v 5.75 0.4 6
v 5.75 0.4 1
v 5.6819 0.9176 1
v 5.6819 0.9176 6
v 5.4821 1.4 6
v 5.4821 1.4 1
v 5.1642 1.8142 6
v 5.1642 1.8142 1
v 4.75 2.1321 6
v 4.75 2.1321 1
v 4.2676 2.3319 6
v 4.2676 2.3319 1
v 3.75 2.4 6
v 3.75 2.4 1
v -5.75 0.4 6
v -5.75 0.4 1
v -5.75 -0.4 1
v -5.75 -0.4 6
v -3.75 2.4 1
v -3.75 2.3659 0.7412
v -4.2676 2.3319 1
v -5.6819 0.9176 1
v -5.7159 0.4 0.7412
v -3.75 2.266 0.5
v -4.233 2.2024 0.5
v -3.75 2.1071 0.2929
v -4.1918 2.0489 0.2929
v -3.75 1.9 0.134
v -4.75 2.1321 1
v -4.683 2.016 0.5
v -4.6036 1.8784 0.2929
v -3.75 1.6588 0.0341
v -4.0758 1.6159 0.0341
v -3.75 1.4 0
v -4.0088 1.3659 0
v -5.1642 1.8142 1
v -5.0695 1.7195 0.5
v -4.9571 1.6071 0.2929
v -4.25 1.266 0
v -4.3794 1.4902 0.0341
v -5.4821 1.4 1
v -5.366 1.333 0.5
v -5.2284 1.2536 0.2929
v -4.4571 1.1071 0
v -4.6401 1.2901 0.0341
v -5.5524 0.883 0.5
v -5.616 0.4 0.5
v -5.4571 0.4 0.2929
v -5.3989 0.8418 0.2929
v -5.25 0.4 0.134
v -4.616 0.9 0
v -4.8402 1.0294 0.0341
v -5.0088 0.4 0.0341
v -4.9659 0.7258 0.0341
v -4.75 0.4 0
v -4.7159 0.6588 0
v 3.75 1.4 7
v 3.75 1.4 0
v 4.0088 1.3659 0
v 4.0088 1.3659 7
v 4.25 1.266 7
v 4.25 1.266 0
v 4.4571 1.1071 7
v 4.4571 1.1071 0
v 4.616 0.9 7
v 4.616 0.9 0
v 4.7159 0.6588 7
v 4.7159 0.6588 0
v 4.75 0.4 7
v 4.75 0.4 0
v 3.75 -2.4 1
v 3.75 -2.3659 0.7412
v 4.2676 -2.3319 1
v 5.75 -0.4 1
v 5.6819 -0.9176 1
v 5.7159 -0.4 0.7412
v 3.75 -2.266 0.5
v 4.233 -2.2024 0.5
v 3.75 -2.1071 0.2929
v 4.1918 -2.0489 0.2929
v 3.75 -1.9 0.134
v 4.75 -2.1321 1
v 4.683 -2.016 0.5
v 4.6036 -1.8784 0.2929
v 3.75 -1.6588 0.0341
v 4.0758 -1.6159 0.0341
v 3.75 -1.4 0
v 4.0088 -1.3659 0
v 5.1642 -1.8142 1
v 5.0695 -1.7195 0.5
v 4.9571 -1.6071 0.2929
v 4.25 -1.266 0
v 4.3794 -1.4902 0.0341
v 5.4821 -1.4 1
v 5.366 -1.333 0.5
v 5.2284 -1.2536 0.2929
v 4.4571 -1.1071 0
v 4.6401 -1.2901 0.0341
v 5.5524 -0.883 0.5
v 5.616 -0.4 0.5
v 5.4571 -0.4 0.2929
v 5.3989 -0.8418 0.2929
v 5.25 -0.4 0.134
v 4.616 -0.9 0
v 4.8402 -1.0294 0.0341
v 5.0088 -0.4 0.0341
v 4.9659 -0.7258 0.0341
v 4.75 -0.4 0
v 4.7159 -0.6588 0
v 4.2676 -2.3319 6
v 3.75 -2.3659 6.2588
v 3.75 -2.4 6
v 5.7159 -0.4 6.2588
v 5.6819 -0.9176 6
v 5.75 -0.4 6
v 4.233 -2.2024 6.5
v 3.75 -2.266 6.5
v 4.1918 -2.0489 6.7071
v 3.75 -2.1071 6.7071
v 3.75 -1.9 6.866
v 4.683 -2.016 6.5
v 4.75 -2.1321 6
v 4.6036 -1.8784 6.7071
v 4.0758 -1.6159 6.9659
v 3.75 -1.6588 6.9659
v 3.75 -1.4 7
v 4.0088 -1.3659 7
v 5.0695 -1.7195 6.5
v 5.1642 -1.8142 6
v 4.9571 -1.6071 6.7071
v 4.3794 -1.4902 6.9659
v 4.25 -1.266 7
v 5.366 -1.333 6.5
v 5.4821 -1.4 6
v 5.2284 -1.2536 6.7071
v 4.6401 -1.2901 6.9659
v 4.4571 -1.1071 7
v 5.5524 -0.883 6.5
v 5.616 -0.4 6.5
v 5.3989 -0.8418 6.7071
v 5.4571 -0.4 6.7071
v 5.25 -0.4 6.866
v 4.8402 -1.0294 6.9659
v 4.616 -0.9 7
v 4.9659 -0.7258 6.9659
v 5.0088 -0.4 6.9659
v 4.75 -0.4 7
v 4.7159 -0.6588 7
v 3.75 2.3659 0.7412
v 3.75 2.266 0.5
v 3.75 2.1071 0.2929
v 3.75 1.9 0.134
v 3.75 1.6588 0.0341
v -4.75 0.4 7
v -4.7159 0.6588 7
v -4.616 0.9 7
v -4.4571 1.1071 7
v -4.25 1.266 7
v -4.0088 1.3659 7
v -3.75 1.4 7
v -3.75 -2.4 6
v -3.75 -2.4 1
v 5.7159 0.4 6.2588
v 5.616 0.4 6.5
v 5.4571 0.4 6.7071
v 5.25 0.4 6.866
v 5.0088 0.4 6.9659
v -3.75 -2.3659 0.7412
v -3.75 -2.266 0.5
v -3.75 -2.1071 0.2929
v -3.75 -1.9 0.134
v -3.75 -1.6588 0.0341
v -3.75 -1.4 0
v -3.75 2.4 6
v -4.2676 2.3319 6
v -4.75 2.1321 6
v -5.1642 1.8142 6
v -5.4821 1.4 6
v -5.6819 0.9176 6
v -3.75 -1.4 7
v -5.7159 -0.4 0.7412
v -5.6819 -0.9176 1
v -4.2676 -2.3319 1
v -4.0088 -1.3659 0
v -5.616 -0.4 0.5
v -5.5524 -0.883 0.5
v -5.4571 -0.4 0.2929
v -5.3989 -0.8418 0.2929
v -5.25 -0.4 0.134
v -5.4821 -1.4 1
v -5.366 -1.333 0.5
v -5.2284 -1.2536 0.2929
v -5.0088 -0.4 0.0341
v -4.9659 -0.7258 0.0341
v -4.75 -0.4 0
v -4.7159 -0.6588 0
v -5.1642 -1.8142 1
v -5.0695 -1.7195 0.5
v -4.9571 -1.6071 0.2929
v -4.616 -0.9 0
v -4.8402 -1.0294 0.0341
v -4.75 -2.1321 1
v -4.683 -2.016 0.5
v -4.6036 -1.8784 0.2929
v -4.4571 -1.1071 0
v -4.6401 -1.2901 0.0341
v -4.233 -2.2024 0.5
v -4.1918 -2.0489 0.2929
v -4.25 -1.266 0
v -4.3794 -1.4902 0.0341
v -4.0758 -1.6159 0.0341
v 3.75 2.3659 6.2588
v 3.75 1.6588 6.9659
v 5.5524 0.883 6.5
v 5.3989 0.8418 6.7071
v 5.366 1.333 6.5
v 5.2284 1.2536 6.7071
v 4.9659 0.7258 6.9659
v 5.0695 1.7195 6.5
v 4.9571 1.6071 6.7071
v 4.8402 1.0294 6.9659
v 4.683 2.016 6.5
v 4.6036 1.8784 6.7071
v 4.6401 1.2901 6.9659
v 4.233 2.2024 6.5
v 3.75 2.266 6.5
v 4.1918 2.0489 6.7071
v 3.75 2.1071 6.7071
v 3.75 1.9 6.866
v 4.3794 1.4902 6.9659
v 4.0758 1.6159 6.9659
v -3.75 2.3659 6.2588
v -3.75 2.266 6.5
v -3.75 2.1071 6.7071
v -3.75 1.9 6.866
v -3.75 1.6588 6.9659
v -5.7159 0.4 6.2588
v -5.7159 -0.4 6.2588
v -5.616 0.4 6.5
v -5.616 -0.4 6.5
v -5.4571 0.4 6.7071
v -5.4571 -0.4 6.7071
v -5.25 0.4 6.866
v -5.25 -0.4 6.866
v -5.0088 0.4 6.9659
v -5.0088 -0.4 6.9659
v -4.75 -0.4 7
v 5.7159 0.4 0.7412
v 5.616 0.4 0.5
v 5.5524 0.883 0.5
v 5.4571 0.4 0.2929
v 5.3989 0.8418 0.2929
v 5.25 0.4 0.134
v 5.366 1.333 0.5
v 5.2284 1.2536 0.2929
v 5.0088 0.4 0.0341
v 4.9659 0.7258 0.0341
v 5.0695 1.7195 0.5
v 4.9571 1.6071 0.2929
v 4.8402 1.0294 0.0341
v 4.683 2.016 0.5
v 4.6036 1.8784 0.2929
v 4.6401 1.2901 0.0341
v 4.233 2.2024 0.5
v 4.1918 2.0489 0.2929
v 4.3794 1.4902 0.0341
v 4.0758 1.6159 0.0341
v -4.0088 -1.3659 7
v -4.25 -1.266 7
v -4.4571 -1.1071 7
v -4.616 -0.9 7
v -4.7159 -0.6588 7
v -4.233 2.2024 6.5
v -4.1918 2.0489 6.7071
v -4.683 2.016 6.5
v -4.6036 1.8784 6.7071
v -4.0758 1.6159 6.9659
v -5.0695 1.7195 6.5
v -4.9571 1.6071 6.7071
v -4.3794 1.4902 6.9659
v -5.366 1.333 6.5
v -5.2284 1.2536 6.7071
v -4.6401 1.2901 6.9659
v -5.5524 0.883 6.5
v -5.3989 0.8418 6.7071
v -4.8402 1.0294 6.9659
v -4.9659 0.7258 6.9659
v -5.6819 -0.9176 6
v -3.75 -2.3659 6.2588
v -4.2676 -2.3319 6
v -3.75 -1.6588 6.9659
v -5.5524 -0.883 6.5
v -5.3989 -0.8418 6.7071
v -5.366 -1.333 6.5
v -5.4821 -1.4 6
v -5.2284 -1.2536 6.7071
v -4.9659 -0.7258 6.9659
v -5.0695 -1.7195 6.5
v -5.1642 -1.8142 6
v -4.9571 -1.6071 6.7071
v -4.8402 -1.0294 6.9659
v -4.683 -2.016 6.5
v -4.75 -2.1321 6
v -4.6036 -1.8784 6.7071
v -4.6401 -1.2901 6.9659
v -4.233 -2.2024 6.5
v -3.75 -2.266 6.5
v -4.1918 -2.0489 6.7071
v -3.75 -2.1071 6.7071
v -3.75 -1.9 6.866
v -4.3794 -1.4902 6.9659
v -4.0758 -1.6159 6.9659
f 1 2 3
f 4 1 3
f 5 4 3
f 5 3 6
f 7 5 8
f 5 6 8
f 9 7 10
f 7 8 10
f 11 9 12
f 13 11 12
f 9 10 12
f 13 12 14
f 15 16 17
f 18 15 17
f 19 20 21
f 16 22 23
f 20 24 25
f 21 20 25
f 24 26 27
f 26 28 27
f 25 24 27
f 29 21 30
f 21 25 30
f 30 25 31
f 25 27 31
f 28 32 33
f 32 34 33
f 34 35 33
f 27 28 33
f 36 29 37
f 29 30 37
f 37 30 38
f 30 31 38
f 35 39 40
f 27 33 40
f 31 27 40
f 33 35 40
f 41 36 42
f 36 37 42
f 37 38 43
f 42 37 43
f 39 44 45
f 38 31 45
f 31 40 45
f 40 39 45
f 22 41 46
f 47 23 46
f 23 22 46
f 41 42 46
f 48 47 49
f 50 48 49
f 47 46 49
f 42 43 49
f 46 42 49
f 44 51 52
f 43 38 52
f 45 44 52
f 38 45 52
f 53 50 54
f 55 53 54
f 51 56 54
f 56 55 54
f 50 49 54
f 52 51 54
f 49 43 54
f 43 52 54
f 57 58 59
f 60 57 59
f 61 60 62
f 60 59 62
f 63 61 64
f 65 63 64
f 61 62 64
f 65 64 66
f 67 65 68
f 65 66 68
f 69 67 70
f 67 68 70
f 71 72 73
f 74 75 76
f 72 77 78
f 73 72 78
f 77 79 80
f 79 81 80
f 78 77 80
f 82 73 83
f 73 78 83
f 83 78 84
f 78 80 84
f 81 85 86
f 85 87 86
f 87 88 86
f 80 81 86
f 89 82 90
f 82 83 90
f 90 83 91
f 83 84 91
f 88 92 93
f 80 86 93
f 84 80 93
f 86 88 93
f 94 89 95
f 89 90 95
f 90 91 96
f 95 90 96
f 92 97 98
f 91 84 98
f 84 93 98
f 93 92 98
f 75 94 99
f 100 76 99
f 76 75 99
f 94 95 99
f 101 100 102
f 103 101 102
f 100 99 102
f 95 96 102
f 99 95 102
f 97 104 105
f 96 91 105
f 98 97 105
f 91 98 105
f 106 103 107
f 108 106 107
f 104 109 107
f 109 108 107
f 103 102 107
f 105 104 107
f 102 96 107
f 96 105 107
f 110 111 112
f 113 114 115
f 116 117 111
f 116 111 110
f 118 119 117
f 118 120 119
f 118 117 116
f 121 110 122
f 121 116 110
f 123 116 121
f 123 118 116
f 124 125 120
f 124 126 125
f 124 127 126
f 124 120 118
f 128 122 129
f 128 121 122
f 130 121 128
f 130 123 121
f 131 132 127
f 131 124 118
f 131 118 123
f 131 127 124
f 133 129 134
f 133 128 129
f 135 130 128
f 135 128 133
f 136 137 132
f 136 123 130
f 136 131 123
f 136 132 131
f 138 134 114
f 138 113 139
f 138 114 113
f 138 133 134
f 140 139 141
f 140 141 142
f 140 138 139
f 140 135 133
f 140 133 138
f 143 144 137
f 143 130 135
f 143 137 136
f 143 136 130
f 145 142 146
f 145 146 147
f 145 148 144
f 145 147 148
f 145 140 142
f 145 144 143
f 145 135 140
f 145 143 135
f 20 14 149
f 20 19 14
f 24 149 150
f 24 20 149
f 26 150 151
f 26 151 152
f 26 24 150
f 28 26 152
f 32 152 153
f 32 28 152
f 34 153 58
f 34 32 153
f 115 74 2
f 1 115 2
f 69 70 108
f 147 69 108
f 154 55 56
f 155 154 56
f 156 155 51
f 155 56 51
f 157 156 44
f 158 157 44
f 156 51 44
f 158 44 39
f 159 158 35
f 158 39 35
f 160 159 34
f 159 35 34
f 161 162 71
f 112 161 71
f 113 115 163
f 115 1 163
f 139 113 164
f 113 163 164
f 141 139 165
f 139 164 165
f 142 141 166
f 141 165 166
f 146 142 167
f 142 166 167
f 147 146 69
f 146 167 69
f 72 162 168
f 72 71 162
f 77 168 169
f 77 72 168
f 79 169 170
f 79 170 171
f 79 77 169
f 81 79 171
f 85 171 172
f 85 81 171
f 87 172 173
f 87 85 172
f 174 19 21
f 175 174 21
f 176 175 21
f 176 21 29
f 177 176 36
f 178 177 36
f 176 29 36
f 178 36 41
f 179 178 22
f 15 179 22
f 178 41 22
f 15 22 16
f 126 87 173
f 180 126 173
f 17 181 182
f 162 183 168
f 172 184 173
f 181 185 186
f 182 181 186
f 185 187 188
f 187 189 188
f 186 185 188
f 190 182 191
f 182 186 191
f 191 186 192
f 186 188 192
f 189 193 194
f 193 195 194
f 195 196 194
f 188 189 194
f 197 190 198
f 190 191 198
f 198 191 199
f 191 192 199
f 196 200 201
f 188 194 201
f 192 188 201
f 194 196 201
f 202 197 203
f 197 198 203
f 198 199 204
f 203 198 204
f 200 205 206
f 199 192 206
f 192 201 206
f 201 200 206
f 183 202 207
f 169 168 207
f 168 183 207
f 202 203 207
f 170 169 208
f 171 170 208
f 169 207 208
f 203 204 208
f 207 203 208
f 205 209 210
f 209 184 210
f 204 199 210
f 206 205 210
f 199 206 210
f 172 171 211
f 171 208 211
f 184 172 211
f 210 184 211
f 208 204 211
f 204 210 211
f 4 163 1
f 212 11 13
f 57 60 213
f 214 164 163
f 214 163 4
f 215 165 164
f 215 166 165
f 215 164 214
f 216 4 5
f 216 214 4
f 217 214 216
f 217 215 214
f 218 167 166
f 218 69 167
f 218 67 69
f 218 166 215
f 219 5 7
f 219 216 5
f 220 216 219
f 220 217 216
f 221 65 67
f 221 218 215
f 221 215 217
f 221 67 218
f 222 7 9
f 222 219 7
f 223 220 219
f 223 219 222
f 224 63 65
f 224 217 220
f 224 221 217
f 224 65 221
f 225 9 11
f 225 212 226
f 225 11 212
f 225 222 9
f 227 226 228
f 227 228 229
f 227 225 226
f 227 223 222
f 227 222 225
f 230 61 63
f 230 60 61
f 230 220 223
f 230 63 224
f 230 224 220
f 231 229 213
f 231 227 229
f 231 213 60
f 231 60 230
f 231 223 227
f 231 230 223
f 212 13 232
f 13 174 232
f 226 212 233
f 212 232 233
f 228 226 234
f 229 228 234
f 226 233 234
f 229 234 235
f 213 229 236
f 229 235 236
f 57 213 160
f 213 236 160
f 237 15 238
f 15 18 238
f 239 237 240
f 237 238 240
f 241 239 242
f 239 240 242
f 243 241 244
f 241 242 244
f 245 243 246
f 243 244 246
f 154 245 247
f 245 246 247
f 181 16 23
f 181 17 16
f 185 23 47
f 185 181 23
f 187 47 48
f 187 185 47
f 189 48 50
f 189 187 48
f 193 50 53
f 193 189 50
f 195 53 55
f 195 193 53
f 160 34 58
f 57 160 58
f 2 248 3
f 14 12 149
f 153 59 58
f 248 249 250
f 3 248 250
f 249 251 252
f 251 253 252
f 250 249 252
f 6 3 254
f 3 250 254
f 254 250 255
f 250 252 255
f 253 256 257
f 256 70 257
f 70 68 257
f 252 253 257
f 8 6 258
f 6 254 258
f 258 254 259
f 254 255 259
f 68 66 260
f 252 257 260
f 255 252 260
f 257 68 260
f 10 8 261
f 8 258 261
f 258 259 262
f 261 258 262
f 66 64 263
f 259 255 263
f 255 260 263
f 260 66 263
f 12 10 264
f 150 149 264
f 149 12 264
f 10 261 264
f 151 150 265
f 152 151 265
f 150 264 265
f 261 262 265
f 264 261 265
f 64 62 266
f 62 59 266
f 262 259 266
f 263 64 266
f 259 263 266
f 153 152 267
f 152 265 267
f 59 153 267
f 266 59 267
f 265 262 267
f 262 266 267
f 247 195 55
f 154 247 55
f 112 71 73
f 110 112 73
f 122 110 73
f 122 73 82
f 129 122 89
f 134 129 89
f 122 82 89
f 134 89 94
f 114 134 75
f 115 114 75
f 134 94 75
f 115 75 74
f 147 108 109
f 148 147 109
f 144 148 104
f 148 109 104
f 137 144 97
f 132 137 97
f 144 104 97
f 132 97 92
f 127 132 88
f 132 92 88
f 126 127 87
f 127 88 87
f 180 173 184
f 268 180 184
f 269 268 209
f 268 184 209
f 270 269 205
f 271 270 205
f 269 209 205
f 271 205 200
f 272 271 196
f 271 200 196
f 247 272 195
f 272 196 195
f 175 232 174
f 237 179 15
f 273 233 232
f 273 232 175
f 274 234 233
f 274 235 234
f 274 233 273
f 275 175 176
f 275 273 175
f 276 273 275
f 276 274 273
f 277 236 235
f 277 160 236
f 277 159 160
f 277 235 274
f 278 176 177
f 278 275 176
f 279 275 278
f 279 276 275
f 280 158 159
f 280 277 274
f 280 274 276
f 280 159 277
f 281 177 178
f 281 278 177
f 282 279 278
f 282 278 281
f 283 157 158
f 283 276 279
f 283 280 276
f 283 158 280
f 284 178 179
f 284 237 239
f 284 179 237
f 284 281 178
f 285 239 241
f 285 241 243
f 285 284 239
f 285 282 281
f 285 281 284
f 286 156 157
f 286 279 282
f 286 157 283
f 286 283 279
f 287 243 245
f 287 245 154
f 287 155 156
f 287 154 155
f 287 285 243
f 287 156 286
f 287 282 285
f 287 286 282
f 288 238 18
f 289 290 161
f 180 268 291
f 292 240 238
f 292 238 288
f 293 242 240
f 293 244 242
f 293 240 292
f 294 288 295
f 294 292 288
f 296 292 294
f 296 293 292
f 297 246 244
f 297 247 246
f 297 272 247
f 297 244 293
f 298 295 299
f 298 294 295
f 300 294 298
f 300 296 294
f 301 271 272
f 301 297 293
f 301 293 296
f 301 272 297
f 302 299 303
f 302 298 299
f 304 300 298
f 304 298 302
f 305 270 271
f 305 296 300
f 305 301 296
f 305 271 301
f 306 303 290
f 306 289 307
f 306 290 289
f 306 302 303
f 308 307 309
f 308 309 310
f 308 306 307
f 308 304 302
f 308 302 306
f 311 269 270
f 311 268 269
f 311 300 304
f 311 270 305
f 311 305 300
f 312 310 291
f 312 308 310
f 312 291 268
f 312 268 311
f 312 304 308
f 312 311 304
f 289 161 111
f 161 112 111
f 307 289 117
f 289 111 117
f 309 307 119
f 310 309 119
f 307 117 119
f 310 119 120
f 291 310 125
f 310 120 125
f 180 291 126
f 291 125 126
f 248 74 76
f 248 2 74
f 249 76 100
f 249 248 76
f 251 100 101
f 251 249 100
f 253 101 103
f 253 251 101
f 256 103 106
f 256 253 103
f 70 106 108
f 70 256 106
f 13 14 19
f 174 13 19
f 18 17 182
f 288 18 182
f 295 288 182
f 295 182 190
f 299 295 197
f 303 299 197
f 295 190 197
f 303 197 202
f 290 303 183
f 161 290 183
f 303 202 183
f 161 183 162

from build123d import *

# Parameters (mm, degrees)
F1_DEPTH = 7
F2_R     = 0.99999


# Not quite as in the source:
# - a fillet or chamfer is up to 0.001 mm smaller than in the source, because OpenCascade refuses the exact size


with BuildPart() as f1:
    # F0 (on Top) → F1 (new body)
    with BuildSketch(Plane.XY):
        with BuildLine():
            Line((-3.75, -2.4), (3.75, -2.4))
            ThreePointArc((3.75, -2.4), (5.1642135624, -1.8142135624), (5.75, -0.4))
            Line((5.75, -0.4), (5.75, 0.4))
            ThreePointArc((5.75, 0.4), (5.1642135624, 1.8142135624), (3.75, 2.4))
            Line((3.75, 2.4), (-3.75, 2.4))
            ThreePointArc((-3.75, 2.4), (-5.1642135624, 1.8142135624), (-5.75, 0.4))
            Line((-5.75, 0.4), (-5.75, -0.4))
            ThreePointArc((-5.75, -0.4), (-5.1642135624, -1.8142135624), (-3.75, -2.4))
        make_face()
        with BuildLine():
            ThreePointArc((4.75, -0.4), (4.4571067812, -1.1071067812), (3.75, -1.4))
            Line((3.75, -1.4), (-3.75, -1.4))
            ThreePointArc((-3.75, -1.4), (-4.4571067812, -1.1071067812), (-4.75, -0.4))
            Line((-4.75, -0.4), (-4.75, 0.4))
            ThreePointArc((-4.75, 0.4), (-4.4571067812, 1.1071067812), (-3.75, 1.4))
            Line((-3.75, 1.4), (3.75, 1.4))
            ThreePointArc((3.75, 1.4), (4.4571067812, 1.1071067812), (4.75, 0.4))
            Line((4.75, 0.4), (4.75, -0.4))
        make_face(mode=Mode.SUBTRACT)
    extrude(amount=F1_DEPTH)

    # F2 (radius 1 in the source; OpenCascade refuses exactly that, so slightly less here)
    f2_edges = [f1.edges().sort_by_distance(p)[0] for p in [
        (0, 2.4, 7),
        (0, 2.4, 0),
    ]]
    fillet(f2_edges, radius=F2_R)


solid = f1.part
